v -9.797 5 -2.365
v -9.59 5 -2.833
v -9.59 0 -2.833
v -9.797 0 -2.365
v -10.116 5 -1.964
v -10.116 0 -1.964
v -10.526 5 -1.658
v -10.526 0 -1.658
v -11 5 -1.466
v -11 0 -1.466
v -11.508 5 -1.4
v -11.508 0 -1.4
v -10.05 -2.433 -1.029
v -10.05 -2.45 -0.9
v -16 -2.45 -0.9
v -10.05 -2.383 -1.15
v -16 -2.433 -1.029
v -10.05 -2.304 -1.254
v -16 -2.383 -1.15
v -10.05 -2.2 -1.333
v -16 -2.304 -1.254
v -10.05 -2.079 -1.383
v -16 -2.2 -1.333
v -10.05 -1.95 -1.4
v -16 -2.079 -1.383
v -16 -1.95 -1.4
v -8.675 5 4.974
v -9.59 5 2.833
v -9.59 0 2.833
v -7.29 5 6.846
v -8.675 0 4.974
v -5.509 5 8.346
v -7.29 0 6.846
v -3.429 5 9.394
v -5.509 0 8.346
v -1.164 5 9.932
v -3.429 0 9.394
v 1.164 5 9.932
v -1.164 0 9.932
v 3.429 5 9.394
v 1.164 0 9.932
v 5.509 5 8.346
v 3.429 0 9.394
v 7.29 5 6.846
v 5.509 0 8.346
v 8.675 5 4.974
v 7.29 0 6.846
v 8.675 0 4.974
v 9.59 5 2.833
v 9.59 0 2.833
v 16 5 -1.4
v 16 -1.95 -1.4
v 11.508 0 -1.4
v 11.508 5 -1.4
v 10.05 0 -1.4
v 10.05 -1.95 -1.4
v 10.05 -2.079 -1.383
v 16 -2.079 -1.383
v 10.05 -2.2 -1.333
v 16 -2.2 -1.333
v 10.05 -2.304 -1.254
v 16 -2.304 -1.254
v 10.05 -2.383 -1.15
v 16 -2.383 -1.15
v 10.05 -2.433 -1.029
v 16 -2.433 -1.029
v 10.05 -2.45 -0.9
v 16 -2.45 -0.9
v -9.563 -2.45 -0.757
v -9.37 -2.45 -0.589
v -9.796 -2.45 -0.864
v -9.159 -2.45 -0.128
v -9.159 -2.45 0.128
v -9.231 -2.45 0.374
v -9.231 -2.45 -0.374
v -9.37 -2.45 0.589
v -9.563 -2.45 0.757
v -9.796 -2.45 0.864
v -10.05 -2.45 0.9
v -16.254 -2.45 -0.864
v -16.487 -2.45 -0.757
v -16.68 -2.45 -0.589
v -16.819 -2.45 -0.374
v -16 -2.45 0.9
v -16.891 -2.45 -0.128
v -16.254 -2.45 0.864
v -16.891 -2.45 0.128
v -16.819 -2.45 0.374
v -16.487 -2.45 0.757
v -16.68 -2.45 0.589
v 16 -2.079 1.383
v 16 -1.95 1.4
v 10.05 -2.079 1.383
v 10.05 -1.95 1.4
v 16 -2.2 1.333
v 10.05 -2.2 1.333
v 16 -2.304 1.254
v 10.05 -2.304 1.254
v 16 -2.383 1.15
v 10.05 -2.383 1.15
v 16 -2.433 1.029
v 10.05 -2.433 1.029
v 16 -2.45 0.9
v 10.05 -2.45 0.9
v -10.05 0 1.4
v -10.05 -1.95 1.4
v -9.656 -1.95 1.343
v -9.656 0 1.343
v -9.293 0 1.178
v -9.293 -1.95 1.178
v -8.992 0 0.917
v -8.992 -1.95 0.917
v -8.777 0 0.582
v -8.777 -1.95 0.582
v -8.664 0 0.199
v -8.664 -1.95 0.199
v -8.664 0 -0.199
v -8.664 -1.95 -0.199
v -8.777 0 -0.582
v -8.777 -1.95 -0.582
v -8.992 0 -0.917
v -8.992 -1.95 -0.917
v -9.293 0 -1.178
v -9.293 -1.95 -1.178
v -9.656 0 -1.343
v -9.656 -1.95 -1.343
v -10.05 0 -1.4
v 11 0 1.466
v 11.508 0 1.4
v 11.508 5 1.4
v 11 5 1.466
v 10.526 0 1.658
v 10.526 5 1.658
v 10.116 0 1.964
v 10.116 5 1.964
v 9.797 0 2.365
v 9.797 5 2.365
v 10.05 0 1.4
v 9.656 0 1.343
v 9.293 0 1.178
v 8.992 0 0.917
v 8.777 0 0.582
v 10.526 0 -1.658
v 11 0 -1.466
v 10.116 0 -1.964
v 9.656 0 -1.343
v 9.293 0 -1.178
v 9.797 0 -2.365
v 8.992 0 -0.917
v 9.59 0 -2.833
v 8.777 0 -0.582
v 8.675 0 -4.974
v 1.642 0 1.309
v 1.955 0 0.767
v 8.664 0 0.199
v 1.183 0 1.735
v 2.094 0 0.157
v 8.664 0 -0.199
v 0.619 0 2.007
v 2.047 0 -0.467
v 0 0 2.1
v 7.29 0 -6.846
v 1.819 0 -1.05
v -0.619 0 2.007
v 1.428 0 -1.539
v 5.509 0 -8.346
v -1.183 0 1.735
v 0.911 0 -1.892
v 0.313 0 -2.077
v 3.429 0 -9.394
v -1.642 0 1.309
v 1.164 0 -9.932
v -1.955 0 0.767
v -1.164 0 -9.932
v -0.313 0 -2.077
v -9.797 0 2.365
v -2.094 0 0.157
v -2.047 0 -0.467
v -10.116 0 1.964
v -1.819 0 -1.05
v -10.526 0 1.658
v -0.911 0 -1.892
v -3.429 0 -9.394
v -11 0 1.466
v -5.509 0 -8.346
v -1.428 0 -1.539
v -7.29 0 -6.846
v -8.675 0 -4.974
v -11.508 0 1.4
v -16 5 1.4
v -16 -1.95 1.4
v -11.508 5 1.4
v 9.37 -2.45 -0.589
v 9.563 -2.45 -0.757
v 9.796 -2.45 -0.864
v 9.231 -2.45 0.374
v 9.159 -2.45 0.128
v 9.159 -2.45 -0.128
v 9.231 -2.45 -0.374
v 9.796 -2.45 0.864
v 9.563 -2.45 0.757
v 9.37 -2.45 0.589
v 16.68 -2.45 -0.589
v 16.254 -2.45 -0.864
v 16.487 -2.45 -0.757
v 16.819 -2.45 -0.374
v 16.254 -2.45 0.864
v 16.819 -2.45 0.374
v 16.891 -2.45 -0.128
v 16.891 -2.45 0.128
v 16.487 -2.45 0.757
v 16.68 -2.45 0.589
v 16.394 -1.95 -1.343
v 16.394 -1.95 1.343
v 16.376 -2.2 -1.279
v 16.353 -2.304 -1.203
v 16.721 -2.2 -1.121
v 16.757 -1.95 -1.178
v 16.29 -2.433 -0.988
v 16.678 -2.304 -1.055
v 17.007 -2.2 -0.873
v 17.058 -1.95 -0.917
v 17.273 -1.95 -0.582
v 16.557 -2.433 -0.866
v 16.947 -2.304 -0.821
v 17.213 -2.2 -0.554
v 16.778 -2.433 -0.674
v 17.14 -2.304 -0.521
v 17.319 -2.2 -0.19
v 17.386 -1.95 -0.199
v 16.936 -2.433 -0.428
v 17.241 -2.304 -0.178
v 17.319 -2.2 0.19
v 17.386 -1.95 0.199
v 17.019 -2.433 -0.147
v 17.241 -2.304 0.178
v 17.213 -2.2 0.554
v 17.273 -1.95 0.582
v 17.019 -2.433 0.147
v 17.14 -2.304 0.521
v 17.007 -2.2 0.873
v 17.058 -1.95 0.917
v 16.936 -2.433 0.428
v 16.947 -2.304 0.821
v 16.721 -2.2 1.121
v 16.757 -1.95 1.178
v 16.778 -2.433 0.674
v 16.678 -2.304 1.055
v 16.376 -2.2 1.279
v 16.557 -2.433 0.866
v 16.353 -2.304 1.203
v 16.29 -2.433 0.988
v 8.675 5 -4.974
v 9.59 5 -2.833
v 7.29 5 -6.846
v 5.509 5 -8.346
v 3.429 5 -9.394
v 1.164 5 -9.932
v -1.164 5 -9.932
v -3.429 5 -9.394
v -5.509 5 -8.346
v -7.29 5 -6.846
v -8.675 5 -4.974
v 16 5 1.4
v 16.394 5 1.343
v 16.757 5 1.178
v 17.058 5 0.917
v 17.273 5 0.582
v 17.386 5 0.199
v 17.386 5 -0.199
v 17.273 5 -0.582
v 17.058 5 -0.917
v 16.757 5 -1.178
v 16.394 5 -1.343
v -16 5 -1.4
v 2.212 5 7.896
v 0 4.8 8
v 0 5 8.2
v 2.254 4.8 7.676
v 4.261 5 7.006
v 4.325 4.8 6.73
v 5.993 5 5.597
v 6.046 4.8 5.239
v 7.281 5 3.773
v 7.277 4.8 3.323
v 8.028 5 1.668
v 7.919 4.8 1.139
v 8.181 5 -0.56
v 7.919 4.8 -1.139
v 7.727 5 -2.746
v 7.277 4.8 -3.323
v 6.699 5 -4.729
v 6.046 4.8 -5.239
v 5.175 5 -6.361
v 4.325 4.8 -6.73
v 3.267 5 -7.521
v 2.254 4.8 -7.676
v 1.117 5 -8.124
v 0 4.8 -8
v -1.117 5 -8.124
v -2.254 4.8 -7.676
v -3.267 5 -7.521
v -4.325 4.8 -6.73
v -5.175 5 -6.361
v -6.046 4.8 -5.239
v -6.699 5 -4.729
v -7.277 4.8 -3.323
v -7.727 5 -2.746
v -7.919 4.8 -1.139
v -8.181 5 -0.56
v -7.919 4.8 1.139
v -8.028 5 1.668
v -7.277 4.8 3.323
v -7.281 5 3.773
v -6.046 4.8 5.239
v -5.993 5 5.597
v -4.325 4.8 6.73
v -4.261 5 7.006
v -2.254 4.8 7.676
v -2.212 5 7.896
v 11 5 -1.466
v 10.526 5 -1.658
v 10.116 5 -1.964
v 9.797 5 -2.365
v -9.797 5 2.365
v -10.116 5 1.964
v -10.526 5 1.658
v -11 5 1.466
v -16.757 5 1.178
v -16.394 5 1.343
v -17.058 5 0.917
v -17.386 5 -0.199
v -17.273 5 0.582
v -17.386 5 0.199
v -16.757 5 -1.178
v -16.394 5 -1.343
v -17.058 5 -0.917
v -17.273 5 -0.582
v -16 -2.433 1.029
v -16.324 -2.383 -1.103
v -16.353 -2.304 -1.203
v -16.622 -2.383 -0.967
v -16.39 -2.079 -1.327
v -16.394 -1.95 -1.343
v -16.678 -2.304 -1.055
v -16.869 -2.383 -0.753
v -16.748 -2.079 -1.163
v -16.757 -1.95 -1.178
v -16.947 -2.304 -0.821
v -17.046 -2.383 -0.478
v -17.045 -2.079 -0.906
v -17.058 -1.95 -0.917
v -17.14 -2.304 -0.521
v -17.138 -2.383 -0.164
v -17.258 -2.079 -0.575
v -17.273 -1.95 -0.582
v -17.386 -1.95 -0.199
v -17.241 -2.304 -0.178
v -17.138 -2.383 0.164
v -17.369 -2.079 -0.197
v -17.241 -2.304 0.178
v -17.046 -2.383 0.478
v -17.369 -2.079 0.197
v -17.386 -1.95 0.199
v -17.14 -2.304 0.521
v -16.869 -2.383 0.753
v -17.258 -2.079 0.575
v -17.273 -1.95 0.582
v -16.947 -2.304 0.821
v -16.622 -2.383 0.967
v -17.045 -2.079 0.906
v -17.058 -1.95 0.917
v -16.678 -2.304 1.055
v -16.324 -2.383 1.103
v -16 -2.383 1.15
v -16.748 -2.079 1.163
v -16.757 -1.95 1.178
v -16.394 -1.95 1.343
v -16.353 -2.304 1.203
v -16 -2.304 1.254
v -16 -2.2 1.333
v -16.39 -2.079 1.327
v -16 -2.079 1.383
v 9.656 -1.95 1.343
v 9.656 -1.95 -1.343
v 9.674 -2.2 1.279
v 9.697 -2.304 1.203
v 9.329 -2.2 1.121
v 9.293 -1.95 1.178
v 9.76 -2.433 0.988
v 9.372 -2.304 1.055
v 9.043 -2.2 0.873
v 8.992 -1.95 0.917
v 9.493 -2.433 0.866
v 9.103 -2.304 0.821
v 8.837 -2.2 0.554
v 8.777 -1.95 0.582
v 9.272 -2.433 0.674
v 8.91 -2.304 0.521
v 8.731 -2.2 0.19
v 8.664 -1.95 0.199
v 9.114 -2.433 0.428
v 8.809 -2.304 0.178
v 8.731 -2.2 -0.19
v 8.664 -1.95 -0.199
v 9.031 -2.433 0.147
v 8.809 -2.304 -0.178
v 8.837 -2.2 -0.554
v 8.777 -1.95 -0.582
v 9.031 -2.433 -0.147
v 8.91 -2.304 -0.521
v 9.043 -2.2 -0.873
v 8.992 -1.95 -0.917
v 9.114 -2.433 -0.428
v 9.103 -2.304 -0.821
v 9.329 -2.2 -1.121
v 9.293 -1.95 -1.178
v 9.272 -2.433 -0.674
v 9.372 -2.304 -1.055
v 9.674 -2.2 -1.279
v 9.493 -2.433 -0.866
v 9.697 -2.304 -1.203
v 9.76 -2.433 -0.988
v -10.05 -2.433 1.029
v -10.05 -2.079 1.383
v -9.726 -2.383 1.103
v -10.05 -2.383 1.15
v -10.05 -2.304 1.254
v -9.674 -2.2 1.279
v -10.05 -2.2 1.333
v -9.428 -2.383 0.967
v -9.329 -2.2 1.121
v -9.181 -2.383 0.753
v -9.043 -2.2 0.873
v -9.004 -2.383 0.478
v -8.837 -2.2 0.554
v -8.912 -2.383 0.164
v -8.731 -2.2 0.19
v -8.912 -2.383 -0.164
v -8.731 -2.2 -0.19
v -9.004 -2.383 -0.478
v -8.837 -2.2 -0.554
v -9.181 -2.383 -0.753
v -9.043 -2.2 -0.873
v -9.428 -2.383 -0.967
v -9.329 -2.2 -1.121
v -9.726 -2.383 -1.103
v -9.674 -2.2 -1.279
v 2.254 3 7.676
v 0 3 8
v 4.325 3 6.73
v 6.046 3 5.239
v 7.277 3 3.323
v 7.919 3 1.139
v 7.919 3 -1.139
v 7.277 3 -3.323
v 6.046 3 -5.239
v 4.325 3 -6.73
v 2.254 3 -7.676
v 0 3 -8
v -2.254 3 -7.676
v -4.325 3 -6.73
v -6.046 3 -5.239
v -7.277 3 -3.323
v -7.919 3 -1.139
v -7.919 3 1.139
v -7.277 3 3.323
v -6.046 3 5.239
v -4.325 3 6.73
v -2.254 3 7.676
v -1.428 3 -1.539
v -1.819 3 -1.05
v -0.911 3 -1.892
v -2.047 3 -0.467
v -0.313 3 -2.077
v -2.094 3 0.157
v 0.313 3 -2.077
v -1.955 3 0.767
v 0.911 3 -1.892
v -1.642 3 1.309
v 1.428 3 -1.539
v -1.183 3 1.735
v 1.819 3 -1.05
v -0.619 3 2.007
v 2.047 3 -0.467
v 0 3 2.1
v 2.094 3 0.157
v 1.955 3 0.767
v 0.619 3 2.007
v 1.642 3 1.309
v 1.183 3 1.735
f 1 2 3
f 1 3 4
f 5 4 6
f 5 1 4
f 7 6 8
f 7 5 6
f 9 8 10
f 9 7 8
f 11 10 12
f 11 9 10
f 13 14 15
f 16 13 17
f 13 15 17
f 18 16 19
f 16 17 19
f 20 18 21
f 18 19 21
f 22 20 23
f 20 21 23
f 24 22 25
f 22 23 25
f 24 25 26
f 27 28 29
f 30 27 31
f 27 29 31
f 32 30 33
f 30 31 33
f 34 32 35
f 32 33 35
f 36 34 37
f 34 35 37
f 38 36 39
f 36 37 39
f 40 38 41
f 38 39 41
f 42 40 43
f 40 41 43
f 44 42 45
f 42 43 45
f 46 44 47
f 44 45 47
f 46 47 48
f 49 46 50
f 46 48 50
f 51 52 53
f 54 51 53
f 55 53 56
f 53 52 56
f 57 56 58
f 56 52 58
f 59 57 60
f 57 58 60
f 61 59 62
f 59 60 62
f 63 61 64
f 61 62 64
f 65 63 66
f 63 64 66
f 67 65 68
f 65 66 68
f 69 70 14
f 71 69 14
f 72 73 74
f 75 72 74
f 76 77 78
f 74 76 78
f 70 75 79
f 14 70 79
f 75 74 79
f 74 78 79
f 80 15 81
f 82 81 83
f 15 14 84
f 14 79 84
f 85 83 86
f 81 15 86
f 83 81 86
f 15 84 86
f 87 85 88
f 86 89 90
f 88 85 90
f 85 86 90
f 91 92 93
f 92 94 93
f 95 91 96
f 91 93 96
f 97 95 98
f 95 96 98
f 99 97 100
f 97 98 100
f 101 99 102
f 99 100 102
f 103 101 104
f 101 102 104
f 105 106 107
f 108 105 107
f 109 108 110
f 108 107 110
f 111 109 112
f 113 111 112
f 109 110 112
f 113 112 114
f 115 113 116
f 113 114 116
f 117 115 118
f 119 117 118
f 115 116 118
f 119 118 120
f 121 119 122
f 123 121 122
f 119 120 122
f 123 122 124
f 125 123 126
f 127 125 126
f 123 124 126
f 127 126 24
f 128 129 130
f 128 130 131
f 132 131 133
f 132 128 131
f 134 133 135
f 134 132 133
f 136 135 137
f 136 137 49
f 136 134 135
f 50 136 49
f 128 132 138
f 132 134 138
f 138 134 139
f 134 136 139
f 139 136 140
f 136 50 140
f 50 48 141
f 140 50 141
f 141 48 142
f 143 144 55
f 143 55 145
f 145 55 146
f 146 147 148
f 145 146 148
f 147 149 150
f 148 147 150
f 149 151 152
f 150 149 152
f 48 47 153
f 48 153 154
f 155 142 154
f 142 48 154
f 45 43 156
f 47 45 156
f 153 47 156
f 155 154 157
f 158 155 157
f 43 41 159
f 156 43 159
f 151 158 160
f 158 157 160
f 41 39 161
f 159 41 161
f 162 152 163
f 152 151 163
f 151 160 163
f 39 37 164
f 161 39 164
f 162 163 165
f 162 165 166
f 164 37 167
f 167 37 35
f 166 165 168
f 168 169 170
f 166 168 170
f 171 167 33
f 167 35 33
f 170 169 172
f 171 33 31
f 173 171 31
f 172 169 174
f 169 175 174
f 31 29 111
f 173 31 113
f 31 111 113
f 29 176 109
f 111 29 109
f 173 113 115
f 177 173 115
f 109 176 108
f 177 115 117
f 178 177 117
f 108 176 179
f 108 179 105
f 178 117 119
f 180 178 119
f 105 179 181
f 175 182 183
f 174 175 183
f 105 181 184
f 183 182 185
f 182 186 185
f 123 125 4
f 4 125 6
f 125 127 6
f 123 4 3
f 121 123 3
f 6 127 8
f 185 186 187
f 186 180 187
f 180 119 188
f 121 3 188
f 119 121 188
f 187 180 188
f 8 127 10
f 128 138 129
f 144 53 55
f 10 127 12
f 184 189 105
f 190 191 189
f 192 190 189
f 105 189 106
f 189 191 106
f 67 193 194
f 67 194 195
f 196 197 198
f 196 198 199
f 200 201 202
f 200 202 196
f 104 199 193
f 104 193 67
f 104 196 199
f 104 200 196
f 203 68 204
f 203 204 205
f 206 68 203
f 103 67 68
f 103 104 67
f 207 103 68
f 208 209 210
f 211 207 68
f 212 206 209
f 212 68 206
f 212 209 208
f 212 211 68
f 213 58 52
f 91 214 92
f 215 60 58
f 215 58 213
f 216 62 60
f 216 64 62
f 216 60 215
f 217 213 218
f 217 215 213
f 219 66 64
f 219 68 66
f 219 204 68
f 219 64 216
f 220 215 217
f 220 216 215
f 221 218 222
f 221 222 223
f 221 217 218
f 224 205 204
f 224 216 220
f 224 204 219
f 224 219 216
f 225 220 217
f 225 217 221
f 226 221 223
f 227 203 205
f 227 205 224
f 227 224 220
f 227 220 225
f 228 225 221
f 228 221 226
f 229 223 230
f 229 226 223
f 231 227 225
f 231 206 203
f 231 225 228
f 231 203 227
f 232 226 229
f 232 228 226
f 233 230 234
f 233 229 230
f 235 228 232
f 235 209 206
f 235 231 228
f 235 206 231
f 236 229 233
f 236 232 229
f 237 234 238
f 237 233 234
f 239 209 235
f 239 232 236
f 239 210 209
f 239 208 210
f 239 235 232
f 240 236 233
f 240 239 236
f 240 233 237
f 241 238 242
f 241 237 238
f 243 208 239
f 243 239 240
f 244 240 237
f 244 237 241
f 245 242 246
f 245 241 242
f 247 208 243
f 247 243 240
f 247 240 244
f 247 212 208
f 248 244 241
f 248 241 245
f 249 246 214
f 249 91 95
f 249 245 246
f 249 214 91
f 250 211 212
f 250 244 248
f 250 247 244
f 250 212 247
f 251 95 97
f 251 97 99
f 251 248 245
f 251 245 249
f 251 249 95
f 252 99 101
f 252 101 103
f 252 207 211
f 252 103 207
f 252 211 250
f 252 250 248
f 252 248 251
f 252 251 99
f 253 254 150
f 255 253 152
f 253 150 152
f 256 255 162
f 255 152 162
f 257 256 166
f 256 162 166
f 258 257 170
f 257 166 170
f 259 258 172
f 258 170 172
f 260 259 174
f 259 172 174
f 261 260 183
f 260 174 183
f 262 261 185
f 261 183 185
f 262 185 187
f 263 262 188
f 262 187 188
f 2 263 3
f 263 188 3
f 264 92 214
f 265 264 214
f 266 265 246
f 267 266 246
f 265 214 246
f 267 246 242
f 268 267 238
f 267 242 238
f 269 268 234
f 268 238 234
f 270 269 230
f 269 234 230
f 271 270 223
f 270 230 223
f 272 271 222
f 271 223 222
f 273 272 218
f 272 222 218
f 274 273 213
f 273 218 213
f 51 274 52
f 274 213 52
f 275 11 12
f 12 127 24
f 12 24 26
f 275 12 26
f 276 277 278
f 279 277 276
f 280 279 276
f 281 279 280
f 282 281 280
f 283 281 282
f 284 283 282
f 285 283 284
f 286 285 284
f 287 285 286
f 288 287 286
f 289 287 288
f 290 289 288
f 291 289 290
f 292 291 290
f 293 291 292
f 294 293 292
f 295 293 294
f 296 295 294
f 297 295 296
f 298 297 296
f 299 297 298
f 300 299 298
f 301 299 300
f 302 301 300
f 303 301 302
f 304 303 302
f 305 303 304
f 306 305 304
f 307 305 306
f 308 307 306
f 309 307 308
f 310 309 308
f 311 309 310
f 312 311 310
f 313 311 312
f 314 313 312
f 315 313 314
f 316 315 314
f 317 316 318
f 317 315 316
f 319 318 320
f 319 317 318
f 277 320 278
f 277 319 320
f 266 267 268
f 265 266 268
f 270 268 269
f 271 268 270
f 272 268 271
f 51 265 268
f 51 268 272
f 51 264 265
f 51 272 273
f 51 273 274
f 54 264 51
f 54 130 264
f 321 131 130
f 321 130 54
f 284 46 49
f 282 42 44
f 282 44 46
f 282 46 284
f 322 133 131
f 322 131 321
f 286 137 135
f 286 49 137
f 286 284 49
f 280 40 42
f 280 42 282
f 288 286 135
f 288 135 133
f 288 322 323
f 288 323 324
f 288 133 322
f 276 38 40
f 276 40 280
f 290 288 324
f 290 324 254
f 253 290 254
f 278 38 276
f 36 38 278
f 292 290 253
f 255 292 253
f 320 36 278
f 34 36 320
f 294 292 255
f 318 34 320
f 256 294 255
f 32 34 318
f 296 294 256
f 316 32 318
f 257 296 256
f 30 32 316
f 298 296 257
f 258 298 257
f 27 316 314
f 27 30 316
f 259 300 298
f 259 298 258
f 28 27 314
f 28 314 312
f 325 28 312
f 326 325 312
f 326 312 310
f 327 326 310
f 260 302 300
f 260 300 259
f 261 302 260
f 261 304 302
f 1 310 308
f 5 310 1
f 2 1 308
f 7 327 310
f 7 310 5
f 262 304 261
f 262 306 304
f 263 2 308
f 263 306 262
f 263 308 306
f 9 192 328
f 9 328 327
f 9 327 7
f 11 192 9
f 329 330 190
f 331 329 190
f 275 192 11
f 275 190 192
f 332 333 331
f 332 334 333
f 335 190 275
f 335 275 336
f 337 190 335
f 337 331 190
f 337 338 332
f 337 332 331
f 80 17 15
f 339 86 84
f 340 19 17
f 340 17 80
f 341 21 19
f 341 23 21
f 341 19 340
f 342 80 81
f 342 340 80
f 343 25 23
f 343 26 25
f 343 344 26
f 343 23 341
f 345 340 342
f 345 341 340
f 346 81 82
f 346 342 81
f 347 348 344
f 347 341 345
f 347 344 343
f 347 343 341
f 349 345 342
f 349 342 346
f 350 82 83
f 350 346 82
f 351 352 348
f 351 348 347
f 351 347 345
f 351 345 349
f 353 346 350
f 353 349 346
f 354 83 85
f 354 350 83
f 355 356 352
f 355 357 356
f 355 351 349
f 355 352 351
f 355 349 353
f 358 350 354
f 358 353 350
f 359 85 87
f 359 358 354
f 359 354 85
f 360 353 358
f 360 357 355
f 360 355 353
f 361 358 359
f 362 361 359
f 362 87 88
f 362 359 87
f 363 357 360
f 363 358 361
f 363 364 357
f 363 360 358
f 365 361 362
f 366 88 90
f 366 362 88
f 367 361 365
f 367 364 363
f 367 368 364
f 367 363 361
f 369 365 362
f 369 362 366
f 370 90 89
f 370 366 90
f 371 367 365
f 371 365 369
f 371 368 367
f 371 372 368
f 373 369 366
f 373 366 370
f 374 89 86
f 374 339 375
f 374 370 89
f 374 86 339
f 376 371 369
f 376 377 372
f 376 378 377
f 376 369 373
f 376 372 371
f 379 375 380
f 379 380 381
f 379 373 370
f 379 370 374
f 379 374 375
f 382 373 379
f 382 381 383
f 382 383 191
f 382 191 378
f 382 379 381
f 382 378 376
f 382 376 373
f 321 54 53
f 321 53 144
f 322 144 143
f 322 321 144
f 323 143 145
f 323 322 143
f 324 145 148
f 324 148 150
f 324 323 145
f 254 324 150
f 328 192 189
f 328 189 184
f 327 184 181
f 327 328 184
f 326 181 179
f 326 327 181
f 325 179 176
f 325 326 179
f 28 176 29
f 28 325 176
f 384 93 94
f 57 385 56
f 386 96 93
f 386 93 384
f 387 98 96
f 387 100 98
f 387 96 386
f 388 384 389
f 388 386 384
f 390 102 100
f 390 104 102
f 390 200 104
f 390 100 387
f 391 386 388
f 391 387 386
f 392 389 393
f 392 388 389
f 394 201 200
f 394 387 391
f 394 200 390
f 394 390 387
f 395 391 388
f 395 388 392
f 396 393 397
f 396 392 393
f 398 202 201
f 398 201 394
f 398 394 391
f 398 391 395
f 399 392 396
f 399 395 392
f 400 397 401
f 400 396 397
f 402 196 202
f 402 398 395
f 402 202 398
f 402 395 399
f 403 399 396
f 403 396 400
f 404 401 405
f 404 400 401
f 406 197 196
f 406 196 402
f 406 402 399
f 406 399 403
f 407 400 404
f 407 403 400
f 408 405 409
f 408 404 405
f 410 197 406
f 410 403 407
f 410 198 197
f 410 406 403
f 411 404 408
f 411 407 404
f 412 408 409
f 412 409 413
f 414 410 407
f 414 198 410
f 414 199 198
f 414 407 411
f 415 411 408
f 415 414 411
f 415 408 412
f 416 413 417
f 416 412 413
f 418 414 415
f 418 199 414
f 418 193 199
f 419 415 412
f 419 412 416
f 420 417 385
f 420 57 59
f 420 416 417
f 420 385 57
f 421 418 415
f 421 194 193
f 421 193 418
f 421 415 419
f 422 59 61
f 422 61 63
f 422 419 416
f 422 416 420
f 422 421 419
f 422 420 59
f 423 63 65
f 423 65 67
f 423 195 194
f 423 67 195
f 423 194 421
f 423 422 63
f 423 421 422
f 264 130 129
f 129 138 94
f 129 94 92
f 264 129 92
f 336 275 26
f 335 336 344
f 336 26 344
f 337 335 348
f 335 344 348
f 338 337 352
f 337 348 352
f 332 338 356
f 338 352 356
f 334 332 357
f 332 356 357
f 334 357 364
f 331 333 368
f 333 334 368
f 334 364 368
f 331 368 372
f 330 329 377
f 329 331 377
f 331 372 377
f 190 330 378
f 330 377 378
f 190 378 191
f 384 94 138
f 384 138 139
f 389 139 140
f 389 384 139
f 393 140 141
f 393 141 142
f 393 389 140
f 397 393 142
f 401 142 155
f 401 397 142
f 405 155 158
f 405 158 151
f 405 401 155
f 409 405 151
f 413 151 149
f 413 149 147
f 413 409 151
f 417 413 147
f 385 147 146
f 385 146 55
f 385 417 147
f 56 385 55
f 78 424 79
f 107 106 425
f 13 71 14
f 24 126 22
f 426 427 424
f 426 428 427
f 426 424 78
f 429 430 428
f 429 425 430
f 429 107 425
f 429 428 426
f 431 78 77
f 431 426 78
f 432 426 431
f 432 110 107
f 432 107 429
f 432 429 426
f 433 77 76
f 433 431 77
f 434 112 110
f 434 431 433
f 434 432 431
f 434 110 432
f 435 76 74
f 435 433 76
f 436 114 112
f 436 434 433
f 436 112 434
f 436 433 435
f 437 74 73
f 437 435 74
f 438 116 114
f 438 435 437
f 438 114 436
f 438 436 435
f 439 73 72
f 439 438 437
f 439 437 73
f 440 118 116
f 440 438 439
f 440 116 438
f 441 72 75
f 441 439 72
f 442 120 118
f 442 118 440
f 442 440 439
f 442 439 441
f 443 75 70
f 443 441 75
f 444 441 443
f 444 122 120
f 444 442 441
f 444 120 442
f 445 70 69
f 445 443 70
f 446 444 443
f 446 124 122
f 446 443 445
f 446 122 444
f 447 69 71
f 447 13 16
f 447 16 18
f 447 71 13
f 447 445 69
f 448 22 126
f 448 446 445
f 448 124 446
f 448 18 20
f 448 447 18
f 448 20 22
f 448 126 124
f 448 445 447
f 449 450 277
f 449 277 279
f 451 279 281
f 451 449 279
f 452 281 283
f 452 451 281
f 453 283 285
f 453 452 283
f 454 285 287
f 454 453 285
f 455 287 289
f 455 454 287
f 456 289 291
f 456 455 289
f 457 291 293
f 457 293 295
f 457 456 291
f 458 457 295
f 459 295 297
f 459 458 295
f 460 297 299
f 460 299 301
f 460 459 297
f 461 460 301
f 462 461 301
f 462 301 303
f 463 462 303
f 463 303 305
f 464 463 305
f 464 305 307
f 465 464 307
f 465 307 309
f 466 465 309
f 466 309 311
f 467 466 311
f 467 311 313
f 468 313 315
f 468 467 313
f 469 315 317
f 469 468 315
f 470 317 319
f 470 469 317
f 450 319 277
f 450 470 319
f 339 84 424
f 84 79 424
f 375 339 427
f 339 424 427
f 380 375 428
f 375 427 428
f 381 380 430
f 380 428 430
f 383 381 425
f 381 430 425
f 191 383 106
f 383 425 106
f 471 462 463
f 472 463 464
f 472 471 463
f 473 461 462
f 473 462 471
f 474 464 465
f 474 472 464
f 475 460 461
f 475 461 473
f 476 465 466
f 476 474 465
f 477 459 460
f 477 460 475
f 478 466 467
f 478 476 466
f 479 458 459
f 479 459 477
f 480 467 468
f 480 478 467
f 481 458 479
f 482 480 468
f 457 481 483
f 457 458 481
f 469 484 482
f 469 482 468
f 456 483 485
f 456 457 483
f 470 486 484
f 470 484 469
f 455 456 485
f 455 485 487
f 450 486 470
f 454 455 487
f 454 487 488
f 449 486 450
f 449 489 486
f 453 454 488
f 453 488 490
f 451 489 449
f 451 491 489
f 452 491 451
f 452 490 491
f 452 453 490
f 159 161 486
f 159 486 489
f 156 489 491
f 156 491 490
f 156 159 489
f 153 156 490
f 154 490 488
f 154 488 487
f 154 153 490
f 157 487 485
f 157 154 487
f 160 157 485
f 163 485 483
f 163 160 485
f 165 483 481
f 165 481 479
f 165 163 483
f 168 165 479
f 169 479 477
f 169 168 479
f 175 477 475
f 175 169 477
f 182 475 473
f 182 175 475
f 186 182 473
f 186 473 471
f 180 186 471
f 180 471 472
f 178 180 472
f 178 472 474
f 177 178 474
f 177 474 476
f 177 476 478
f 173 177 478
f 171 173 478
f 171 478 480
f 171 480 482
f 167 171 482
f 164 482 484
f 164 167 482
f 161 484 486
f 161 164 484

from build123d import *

# Parameters (mm, degrees)
ESQUISSE1_R        = 10
ESQUISSE1_R_2      = 2.1
BOSS_EXTRU_1_DEPTH = 3
BOSS_EXTRU_2_DEPTH = 5
BOSS_EXTRU_3_START = 2.45
BOSS_EXTRU_3_DEPTH = 2.45
ESQUISSE4_R        = 10
ESQUISSE4_R_2      = 8
BOSS_EXTRU_4_DEPTH = 2
CONG_5_R           = 2
CONG_6_R           = 2
CONG_7_R           = 2
CONG_8_R           = 2
CONG_10_R          = 0.5
CHANFREIN1_SIZE    = 0.2


with BuildPart() as part:
    # Esquisse1 → Boss.-Extru.1 (new body)
    with BuildSketch(Plane(origin=(0, 0, 0), x_dir=(1, 0, 0), z_dir=(0, 1, 0))):
        with Locations(Location((0, 0, 0), (0, 0, 270))):
            Circle(ESQUISSE1_R)
        with Locations(Location((0, 0, 0), (0, 0, 270))):
            Circle(ESQUISSE1_R_2, mode=Mode.SUBTRACT)
    extrude(amount=BOSS_EXTRU_1_DEPTH)

    # Esquisse2 → Boss.-Extru.2 (add)
    with BuildSketch(Plane(origin=(0, 0, 0), x_dir=(1, 0, 0), z_dir=(0, 1, 0))):
        with BuildLine():
            Line((-9.901515036, -1.4), (-16, -1.4))
            ThreePointArc((-16, -1.4), (-17.4, 0), (-16, 1.4))
            Line((-16, 1.4), (-9.901515036, 1.4))
            ThreePointArc((-9.901515036, 1.4), (-8.501515036, 0), (-9.901515036, -1.4))
        make_face()
        with BuildLine():
            Line((9.901515036, -1.4), (16, -1.4))
            ThreePointArc((16, -1.4), (17.4, 0), (16, 1.4))
            Line((16, 1.4), (9.901515036, 1.4))
            ThreePointArc((9.901515036, 1.4), (8.501515036, 0), (9.901515036, -1.4))
        make_face()
    extrude(amount=BOSS_EXTRU_2_DEPTH)

    # Esquisse3 → Boss.-Extru.3 (add)
    with BuildSketch(Plane.XZ.offset(BOSS_EXTRU_3_START)):
        with BuildLine():
            Line((-10.05, -1.4), (-16, -1.4))
            ThreePointArc((-16, -1.4), (-17.4, 0), (-16, 1.4))
            Line((-16, 1.4), (-10.05, 1.4))
            ThreePointArc((-10.05, 1.4), (-8.65, 0), (-10.05, -1.4))
        make_face()
        with BuildLine():
            Line((10.05, -1.4), (16, -1.4))
            ThreePointArc((16, -1.4), (17.4, 0), (16, 1.4))
            Line((16, 1.4), (10.05, 1.4))
            ThreePointArc((10.05, 1.4), (8.65, 0), (10.05, -1.4))
        make_face()
    extrude(amount=-BOSS_EXTRU_3_DEPTH)

    # Esquisse4 → Boss.-Extru.4 (add)
    with BuildSketch(Plane(origin=(0, 3, 0), x_dir=(1, 0, 0), z_dir=(0, 1, 0))):
        Circle(ESQUISSE4_R)
        with Locations(Location((0, 0, 0), (0, 0, 270))):
            Circle(ESQUISSE4_R_2, mode=Mode.SUBTRACT)
    extrude(amount=BOSS_EXTRU_4_DEPTH)

    # Congé5
    # the kernel refuses this fillet: 2 mm, written as the material it adds along each edge
    with BuildSketch(Plane(origin=(9.901515036, 5, -1.4), x_dir=(1, 0, 0), z_dir=(0, -1, 0))) as cong_5_piece_1:
        with BuildLine():
            CenterArc((1.606742869, -2), CONG_5_R, 90, 73.540750372)
            ThreePointArc((-0.311300115, -1.433333333), (-0.129335377, -0.72238185), (0, 0))
            Line((0, 0), (1.606742869, 0))
        make_face()
    extrude(amount=5)

    # Congé6
    # the kernel refuses this fillet: 2 mm, written as the material it adds along each edge
    with BuildSketch(Plane(origin=(9.901515036, 0, 1.4), x_dir=(1, 0, 0), z_dir=(0, 1, 0))) as cong_6_piece_1:
        with BuildLine():
            CenterArc((1.606742869, -2), CONG_6_R, 90, 73.540750372)
            ThreePointArc((-0.311300115, -1.433333333), (-0.129335377, -0.72238185), (0, 0))
            Line((0, 0), (1.606742869, 0))
        make_face()
    extrude(amount=5)

    # Congé7
    # the kernel refuses this fillet: 2 mm, written as the material it adds along each edge
    with BuildSketch(Plane(origin=(-9.901515036, 5, -1.4), x_dir=(0.2122381850229741, 0, -0.9772179658695156), z_dir=(0, -1, 0))) as cong_7_piece_1:
        with BuildLine():
            CenterArc((1.613423741, -1.994614368), CONG_7_R, 94.20570169, 73.540750372)
            Line((-0.34101219, -1.570137998), (0, 0))
            ThreePointArc((0, 0), (0.733374428, -0.026928159), (1.466748856, 0))
        make_face()
    extrude(amount=5)

    # Congé8
    # the kernel refuses this fillet: 2 mm, written as the material it adds along each edge
    with BuildSketch(Plane(origin=(-9.901515036, 5, 1.4), x_dir=(0.21223818502297503, 0, 0.9772179658695155), z_dir=(0, -1, 0))) as cong_8_piece_1:
        with BuildLine():
            CenterArc((1.613423741, 1.994614368), CONG_8_R, 192.253547938, 73.540750372)
            Line((-0.34101219, 1.570137998), (0, 0))
            ThreePointArc((0, 0), (0.733374428, 0.026928159), (1.466748856, 0))
        make_face()
    extrude(amount=5)

    # Congé10
    cong_10_edges = [part.edges().sort_by_distance(p)[0] for p in [
        (-8.65, -2.45, 0),
        (-13.025, -2.45, 1.4),
        (-17.4, -2.45, 0),
        (-13.025, -2.45, -1.4),
        (8.65, -2.45, 0),
        (13.025, -2.45, -1.4),
        (17.4, -2.45, 0),
        (13.025, -2.45, 1.4),
    ]]
    fillet(cong_10_edges, radius=CONG_10_R)

    # Chanfrein1
    chanfrein1_edges = [part.edges().sort_by_distance(p)[0] for p in [
        (0, 5, -8),
    ]]
    chamfer(chanfrein1_edges, length=CHANFREIN1_SIZE)


solid = part.part
